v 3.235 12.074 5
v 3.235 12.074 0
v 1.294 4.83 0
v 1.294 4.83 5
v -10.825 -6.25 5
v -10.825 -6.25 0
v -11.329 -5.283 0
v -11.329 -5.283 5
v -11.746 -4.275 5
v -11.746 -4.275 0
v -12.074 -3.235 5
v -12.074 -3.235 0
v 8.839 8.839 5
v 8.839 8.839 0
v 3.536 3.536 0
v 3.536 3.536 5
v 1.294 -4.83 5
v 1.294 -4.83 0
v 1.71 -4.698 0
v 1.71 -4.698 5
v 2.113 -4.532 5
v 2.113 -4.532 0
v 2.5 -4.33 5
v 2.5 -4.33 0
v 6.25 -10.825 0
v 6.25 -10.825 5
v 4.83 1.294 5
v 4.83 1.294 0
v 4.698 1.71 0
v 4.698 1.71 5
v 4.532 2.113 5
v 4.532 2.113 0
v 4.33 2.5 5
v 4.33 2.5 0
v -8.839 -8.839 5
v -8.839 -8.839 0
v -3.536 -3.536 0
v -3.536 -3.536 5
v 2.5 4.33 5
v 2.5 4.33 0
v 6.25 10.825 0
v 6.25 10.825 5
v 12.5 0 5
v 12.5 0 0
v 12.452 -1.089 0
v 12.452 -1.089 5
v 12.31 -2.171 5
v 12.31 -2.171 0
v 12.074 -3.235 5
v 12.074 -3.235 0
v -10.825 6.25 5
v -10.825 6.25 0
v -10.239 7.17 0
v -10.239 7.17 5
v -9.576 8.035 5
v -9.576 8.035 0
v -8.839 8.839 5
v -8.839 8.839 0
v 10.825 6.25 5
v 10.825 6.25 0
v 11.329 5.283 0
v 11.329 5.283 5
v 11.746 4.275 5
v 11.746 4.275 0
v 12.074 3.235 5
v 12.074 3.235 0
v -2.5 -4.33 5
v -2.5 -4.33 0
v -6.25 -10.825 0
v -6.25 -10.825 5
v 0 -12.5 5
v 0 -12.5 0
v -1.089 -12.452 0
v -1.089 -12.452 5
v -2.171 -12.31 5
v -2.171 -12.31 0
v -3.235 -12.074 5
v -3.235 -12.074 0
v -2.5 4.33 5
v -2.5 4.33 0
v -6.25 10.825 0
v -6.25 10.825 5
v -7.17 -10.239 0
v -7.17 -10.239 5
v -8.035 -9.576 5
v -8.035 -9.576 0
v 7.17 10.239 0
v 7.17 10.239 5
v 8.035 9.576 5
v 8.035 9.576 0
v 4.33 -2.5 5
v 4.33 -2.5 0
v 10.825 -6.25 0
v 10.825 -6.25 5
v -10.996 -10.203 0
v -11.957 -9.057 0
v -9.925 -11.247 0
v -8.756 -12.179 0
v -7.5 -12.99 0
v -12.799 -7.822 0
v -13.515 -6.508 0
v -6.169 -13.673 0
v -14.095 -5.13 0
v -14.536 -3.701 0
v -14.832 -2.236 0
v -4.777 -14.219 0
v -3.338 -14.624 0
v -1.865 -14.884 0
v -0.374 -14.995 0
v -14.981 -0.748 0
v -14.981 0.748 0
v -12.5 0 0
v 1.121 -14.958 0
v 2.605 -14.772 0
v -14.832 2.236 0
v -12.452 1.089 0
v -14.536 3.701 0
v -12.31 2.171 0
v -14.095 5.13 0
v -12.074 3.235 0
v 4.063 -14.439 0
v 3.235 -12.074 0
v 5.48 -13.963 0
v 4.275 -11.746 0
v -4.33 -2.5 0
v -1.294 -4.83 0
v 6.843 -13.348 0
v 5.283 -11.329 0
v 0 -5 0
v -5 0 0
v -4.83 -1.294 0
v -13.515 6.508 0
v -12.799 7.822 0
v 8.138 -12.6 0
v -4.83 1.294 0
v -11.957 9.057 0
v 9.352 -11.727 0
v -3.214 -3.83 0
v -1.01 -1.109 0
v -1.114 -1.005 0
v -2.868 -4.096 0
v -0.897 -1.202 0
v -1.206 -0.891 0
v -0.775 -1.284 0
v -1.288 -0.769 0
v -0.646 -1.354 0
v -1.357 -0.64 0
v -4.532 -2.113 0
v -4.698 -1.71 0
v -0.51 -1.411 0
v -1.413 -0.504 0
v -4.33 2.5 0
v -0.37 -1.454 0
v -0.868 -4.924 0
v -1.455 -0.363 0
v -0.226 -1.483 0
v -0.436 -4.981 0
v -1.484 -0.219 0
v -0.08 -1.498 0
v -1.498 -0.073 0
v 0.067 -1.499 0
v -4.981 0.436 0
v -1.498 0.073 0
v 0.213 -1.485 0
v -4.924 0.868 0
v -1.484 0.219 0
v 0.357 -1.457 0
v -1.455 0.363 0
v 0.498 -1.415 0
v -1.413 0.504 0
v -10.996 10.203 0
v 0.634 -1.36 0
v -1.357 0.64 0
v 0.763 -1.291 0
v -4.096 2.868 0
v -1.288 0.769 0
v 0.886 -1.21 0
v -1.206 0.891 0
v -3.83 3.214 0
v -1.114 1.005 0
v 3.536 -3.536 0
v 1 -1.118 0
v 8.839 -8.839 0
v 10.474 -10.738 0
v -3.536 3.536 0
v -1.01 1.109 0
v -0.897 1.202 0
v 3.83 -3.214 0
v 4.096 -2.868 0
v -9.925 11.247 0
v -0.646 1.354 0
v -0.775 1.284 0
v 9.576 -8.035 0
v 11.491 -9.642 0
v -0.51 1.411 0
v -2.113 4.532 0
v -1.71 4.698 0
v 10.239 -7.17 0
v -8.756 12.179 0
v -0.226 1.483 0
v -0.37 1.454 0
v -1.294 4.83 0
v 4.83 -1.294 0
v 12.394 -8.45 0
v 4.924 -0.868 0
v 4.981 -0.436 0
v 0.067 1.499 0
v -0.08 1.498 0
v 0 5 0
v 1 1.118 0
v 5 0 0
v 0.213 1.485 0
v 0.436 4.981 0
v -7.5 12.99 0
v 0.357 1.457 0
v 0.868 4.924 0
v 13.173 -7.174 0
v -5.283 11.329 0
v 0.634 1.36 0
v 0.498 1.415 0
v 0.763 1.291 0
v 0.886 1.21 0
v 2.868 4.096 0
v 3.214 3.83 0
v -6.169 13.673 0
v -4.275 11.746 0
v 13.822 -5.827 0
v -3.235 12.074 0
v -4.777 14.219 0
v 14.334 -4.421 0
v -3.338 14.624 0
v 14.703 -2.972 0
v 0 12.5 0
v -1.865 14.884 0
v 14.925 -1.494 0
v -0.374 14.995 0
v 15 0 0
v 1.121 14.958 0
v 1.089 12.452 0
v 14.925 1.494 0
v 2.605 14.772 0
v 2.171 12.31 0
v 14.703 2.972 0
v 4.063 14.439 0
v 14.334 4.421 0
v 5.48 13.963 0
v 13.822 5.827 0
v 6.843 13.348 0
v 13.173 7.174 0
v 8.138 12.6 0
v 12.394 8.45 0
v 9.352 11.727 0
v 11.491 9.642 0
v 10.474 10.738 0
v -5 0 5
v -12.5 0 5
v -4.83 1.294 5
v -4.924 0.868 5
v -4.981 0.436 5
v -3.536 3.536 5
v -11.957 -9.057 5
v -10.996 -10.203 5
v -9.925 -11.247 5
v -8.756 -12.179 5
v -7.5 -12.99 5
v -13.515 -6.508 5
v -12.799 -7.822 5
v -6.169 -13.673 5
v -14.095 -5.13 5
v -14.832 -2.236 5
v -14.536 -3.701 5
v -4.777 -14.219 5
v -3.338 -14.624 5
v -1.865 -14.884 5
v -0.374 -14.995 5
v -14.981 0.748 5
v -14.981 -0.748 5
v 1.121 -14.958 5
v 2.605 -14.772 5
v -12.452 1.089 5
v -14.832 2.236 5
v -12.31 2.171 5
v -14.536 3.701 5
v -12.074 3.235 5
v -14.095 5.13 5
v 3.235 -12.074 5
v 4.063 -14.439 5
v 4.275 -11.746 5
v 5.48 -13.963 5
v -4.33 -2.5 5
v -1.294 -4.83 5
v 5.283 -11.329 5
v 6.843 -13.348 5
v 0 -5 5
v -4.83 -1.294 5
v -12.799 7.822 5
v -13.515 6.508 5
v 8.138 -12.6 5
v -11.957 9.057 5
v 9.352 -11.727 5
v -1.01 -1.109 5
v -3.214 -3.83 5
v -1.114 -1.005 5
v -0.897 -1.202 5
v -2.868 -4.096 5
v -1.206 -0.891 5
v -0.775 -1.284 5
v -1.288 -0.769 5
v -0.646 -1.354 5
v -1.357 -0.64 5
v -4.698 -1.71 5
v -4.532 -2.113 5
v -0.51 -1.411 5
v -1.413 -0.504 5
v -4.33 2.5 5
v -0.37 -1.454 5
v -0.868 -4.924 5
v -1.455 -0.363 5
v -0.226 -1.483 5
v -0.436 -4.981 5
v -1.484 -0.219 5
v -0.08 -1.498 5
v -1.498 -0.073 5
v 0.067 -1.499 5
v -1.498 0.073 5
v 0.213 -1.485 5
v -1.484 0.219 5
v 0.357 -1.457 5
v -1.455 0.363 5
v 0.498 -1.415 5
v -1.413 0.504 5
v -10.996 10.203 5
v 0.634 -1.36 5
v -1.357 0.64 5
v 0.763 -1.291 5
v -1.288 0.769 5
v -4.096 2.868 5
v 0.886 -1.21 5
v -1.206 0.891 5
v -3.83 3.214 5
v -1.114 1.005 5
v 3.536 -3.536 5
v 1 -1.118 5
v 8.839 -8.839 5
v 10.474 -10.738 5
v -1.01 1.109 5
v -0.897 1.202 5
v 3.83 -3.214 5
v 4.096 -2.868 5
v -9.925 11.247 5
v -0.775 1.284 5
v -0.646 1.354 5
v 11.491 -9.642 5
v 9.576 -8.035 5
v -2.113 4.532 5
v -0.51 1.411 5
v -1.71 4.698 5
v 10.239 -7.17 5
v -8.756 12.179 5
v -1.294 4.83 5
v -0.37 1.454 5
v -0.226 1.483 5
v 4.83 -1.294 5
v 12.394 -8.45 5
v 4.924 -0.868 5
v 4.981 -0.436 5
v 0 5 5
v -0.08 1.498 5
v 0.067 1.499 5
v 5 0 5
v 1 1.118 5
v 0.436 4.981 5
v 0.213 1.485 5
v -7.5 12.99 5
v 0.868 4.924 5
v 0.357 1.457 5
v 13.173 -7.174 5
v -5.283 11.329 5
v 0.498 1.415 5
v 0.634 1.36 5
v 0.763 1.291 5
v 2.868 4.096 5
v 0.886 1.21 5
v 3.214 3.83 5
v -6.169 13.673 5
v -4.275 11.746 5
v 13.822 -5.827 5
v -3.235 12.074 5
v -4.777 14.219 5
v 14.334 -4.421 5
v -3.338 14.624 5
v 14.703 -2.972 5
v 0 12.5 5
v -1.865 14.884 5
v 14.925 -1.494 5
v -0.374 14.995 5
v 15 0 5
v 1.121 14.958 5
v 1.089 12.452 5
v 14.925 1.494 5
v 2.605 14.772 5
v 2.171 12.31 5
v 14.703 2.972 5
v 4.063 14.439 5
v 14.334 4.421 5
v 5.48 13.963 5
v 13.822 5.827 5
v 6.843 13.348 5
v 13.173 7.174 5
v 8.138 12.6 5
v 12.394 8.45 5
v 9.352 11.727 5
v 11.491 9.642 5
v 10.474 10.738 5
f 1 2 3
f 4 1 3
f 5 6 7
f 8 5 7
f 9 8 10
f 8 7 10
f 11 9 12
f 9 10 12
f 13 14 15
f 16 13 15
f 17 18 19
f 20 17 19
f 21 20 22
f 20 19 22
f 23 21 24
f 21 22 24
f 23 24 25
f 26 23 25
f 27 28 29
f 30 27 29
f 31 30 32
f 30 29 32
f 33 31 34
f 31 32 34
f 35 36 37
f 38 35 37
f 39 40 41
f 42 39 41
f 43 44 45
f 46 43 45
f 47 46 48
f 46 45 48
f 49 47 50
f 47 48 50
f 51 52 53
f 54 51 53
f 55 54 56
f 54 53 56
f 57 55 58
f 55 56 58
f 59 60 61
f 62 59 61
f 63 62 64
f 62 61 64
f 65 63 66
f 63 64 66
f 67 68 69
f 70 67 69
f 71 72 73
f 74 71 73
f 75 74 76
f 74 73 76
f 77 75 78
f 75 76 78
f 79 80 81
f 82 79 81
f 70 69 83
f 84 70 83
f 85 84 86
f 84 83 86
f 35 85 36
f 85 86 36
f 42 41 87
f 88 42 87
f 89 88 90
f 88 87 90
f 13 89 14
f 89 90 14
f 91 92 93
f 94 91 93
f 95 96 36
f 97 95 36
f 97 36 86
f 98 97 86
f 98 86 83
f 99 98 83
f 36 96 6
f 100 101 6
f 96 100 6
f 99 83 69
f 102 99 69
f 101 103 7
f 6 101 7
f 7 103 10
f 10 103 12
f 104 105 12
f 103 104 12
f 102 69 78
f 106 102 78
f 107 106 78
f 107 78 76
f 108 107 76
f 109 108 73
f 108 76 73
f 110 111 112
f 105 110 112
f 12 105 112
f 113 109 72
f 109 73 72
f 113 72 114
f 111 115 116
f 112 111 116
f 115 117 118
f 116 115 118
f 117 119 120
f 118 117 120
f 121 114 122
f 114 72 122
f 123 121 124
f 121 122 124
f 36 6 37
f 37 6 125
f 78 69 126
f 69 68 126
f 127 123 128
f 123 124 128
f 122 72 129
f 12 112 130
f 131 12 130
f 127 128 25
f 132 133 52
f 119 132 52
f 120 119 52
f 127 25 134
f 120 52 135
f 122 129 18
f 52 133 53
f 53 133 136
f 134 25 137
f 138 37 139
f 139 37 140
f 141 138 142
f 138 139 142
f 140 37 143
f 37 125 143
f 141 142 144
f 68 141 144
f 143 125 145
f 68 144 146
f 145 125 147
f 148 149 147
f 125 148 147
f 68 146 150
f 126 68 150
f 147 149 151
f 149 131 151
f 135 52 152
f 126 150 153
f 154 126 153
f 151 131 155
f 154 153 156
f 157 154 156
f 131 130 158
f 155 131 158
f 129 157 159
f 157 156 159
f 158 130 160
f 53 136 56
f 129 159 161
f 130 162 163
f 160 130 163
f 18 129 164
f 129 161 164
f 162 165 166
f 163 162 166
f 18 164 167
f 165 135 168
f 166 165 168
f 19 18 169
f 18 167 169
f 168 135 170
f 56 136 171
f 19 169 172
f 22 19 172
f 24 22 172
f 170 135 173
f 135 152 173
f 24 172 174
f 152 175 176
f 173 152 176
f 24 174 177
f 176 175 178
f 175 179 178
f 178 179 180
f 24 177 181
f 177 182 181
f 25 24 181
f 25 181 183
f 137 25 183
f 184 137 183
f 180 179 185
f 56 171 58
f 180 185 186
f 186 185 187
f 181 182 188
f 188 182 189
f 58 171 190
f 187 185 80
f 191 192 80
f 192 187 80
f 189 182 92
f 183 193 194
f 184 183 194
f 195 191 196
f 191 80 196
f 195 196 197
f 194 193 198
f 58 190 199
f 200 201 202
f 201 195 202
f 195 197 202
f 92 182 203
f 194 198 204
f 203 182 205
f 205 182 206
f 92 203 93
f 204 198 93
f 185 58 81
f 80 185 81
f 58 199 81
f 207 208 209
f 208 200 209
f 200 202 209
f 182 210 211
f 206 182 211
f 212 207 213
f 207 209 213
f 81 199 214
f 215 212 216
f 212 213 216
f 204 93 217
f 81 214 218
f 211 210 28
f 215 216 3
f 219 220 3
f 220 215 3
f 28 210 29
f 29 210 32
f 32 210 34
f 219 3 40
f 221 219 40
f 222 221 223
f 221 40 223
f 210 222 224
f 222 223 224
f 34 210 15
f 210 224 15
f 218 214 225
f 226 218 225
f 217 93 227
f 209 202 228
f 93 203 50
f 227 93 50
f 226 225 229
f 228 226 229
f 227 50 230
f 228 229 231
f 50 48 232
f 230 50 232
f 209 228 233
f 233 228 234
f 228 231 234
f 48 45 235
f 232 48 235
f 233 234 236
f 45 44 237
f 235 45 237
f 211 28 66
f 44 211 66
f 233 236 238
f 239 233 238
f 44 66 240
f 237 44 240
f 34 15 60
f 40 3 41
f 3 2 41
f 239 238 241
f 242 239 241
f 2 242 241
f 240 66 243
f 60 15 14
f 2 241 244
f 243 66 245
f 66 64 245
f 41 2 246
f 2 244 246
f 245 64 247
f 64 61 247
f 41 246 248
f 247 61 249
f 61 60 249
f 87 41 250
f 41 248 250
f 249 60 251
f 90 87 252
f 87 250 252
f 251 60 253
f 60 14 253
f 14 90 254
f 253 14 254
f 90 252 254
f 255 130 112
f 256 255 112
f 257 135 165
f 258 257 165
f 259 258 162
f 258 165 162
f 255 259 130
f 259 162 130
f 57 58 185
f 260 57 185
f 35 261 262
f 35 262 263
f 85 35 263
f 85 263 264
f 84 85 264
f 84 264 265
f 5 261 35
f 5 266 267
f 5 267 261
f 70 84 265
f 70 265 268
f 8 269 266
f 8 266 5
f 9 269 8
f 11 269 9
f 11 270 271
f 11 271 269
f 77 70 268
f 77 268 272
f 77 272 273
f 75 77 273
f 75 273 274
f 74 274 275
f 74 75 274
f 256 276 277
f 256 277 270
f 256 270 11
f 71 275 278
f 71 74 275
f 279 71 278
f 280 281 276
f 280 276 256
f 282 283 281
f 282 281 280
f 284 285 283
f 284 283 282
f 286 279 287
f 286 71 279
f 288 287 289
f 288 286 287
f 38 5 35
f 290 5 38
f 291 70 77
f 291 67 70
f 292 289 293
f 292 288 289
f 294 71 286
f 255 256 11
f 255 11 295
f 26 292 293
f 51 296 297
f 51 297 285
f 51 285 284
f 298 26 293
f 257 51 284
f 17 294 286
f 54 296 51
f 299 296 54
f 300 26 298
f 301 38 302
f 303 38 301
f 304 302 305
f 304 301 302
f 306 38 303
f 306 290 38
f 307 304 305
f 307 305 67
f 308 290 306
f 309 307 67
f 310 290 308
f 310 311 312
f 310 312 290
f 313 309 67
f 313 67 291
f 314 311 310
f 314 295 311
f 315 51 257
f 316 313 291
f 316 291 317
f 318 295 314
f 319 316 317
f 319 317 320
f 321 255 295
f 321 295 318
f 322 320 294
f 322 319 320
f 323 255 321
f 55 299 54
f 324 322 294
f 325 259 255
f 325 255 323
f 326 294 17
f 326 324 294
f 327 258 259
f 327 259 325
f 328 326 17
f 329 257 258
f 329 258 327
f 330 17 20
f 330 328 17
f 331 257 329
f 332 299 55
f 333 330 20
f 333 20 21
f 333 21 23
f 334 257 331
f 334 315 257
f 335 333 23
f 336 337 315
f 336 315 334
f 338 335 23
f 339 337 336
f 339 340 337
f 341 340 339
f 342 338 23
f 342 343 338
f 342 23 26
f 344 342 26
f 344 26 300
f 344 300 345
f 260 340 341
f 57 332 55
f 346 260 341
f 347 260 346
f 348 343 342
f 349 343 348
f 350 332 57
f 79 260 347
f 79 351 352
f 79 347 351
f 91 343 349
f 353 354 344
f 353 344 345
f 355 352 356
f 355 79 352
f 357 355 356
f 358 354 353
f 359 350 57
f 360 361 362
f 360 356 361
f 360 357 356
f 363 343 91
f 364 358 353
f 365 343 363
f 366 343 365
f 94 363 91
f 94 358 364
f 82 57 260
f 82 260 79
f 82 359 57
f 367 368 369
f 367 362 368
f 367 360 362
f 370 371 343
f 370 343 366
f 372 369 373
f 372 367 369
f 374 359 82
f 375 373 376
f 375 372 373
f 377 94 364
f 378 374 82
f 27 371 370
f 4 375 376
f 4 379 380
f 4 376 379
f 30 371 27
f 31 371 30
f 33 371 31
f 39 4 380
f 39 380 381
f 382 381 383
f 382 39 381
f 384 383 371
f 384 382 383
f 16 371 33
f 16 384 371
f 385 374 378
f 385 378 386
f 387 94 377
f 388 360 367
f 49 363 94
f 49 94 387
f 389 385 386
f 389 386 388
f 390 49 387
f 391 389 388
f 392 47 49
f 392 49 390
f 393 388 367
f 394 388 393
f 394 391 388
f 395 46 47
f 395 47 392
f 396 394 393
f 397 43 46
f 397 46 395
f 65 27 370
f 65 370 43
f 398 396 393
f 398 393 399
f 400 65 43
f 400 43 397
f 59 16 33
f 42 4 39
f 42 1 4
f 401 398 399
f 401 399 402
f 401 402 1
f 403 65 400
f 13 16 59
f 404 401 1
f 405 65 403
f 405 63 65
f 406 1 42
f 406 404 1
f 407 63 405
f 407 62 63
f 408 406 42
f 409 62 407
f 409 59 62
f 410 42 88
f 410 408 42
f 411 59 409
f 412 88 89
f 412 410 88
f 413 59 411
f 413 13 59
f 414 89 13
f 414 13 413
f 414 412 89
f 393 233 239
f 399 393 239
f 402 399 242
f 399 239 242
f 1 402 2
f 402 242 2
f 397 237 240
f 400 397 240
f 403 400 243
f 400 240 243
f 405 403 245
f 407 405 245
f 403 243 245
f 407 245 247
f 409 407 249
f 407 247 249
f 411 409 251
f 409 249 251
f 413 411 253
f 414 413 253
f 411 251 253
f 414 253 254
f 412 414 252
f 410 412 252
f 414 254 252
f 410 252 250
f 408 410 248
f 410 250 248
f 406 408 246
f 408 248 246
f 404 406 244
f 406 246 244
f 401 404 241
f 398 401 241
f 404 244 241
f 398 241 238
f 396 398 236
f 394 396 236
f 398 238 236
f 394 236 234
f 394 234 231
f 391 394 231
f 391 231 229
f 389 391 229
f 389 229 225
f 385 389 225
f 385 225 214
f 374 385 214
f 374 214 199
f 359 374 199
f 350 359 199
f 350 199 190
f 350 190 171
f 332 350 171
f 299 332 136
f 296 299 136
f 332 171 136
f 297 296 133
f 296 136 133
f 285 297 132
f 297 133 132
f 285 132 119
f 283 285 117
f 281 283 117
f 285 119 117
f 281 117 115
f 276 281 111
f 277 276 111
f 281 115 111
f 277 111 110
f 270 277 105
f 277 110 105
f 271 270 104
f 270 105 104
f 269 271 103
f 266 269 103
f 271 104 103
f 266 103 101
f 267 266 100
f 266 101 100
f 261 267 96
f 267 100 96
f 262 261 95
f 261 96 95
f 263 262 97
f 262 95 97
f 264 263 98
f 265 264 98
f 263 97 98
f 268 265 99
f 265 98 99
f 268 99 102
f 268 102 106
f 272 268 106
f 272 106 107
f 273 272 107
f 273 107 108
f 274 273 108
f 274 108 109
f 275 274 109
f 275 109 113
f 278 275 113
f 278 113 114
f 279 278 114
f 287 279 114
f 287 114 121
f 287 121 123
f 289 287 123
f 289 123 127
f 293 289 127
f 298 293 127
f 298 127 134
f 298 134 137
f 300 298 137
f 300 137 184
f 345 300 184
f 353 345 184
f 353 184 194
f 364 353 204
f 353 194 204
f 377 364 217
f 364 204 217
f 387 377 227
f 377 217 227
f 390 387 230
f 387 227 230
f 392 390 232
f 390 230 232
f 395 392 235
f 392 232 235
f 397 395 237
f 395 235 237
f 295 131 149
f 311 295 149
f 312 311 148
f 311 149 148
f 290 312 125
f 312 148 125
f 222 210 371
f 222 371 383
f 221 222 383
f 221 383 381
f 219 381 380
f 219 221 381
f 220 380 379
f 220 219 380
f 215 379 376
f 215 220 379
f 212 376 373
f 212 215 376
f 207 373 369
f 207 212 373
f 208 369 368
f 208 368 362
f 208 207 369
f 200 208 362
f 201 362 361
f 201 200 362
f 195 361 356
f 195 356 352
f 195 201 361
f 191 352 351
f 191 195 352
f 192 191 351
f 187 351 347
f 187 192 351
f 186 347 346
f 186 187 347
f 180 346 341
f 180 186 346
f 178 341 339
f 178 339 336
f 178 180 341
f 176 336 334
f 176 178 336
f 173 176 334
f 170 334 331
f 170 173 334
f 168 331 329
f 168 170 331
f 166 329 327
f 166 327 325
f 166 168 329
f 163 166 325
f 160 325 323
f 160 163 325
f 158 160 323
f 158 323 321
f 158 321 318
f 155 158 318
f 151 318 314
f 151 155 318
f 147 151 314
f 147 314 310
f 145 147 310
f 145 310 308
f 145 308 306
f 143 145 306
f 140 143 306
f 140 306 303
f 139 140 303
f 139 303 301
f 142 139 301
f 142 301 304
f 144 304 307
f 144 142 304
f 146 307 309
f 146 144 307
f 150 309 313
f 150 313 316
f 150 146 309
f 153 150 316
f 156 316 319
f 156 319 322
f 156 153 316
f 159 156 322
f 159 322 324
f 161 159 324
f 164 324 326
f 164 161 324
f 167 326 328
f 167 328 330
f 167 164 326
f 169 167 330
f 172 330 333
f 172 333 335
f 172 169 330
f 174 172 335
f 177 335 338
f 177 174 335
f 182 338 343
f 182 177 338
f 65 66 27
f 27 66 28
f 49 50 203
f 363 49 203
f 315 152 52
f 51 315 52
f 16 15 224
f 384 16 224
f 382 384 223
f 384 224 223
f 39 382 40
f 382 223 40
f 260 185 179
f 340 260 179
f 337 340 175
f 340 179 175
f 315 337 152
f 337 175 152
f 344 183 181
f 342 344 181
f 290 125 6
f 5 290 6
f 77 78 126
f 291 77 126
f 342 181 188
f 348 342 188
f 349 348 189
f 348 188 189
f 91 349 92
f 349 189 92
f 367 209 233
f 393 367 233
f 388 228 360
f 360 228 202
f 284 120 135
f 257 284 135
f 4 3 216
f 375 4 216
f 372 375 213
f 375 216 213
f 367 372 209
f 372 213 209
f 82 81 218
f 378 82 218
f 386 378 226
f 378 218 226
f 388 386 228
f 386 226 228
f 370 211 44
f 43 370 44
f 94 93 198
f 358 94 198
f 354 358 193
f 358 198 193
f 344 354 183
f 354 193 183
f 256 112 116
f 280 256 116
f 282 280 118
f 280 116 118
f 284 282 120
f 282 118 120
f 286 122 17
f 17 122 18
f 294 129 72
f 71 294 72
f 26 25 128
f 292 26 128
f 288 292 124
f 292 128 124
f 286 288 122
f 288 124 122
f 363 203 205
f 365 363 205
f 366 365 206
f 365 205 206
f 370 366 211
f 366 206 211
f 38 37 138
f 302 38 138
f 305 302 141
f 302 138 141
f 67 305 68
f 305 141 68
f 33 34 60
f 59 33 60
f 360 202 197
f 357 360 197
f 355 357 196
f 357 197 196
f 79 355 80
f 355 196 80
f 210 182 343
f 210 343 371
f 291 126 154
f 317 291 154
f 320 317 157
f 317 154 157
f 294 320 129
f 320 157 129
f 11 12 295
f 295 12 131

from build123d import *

# Parameters (mm, degrees)
SKETCH_2_R      = 15
EXTRUDE_1_DEPTH = 5


with BuildPart() as part:
    # 草圖2 → 填料-伸長1 (new body)
    with BuildSketch(Plane.XY):
        Circle(SKETCH_2_R)
        with BuildLine():
            Line((0, 5), (0, 12.5))
            ThreePointArc((0, 12.5), (1.631577403, 12.393060767), (3.235238064, 12.074072829))
            Line((3.235238064, 12.074072829), (1.294095226, 4.829629131))
            ThreePointArc((1.294095226, 4.829629131), (0.652630961, 4.957224307), (0, 5))
        make_face(mode=Mode.SUBTRACT)
        with BuildLine():
            Line((2.5, 4.330127019), (6.25, 10.825317547))
            ThreePointArc((6.25, 10.825317547), (7.609517863, 9.916916754), (8.838834765, 8.838834765))
            Line((8.838834765, 8.838834765), (3.535533906, 3.535533906))
            ThreePointArc((3.535533906, 3.535533906), (3.043807145, 3.966766701), (2.5, 4.330127019))
        make_face(mode=Mode.SUBTRACT)
        with BuildLine():
            Line((4.330127019, 2.5), (10.825317547, 6.25))
            ThreePointArc((10.825317547, 6.25), (11.548494156, 4.783542905), (12.074072829, 3.235238064))
            Line((12.074072829, 3.235238064), (4.829629131, 1.294095226))
            ThreePointArc((4.829629131, 1.294095226), (4.619397663, 1.913417162), (4.330127019, 2.5))
        make_face(mode=Mode.SUBTRACT)
        with BuildLine():
            Line((5, 0), (12.5, 0))
            ThreePointArc((12.5, 0), (12.393060767, -1.631577403), (12.074072829, -3.235238064))
            Line((12.074072829, -3.235238064), (4.829629131, -1.294095226))
            ThreePointArc((4.829629131, -1.294095226), (4.957224307, -0.652630961), (5, 0))
        make_face(mode=Mode.SUBTRACT)
        with BuildLine():
            Line((4.330127019, -2.5), (10.825317547, -6.25))
            ThreePointArc((10.825317547, -6.25), (9.916916754, -7.609517863), (8.838834765, -8.838834765))
            Line((8.838834765, -8.838834765), (3.535533906, -3.535533906))
            ThreePointArc((3.535533906, -3.535533906), (3.966766701, -3.043807145), (4.330127019, -2.5))
        make_face(mode=Mode.SUBTRACT)
        with BuildLine():
            Line((2.5, -4.330127019), (6.25, -10.825317547))
            ThreePointArc((6.25, -10.825317547), (4.783542905, -11.548494156), (3.235238064, -12.074072829))
            Line((3.235238064, -12.074072829), (1.294095226, -4.829629131))
            ThreePointArc((1.294095226, -4.829629131), (1.913417162, -4.619397663), (2.5, -4.330127019))
        make_face(mode=Mode.SUBTRACT)
        with BuildLine():
            Line((0, -5), (0, -12.5))
            ThreePointArc((0, -12.5), (-1.631577403, -12.393060767), (-3.235238064, -12.074072829))
            Line((-3.235238064, -12.074072829), (-1.294095226, -4.829629131))
            ThreePointArc((-1.294095226, -4.829629131), (-0.652630961, -4.957224307), (0, -5))
        make_face(mode=Mode.SUBTRACT)
        with BuildLine():
            Line((-2.5, -4.330127019), (-6.25, -10.825317547))
            ThreePointArc((-6.25, -10.825317547), (-7.609517863, -9.916916754), (-8.838834765, -8.838834765))
            Line((-8.838834765, -8.838834765), (-3.535533906, -3.535533906))
            ThreePointArc((-3.535533906, -3.535533906), (-3.043807145, -3.966766701), (-2.5, -4.330127019))
        make_face(mode=Mode.SUBTRACT)
        with BuildLine():
            Line((-4.330127019, -2.5), (-10.825317547, -6.25))
            ThreePointArc((-10.825317547, -6.25), (-11.548494156, -4.783542905), (-12.074072829, -3.235238064))
            Line((-12.074072829, -3.235238064), (-4.829629131, -1.294095226))
            ThreePointArc((-4.829629131, -1.294095226), (-4.619397663, -1.913417162), (-4.330127019, -2.5))
        make_face(mode=Mode.SUBTRACT)
        with BuildLine():
            Line((-5, 0), (-12.5, 0))
            ThreePointArc((-12.5, 0), (-12.393060767, 1.631577403), (-12.074072829, 3.235238064))
            Line((-12.074072829, 3.235238064), (-4.829629131, 1.294095226))
            ThreePointArc((-4.829629131, 1.294095226), (-4.957224307, 0.652630961), (-5, 0))
        make_face(mode=Mode.SUBTRACT)
        with BuildLine():
            Line((-4.330127019, 2.5), (-10.825317547, 6.25))
            ThreePointArc((-10.825317547, 6.25), (-9.916916754, 7.609517863), (-8.838834765, 8.838834765))
            Line((-8.838834765, 8.838834765), (-3.535533906, 3.535533906))
            ThreePointArc((-3.535533906, 3.535533906), (-3.966766701, 3.043807145), (-4.330127019, 2.5))
        make_face(mode=Mode.SUBTRACT)
        with BuildLine():
            Line((-2.5, 4.330127019), (-6.25, 10.825317547))
            ThreePointArc((-6.25, 10.825317547), (-4.783542905, 11.548494156), (-3.235238064, 12.074072829))
            Line((-3.235238064, 12.074072829), (-1.294095226, 4.829629131))
            ThreePointArc((-1.294095226, 4.829629131), (-1.913417162, 4.619397663), (-2.5, 4.330127019))
        make_face(mode=Mode.SUBTRACT)
        with BuildLine():
            Line((1, -1.118033989), (1, 1.118033989))
            ThreePointArc((1, 1.118033989), (-1.5, 0), (1, -1.118033989))
        make_face(mode=Mode.SUBTRACT)
    extrude(amount=EXTRUDE_1_DEPTH)


solid = part.part
